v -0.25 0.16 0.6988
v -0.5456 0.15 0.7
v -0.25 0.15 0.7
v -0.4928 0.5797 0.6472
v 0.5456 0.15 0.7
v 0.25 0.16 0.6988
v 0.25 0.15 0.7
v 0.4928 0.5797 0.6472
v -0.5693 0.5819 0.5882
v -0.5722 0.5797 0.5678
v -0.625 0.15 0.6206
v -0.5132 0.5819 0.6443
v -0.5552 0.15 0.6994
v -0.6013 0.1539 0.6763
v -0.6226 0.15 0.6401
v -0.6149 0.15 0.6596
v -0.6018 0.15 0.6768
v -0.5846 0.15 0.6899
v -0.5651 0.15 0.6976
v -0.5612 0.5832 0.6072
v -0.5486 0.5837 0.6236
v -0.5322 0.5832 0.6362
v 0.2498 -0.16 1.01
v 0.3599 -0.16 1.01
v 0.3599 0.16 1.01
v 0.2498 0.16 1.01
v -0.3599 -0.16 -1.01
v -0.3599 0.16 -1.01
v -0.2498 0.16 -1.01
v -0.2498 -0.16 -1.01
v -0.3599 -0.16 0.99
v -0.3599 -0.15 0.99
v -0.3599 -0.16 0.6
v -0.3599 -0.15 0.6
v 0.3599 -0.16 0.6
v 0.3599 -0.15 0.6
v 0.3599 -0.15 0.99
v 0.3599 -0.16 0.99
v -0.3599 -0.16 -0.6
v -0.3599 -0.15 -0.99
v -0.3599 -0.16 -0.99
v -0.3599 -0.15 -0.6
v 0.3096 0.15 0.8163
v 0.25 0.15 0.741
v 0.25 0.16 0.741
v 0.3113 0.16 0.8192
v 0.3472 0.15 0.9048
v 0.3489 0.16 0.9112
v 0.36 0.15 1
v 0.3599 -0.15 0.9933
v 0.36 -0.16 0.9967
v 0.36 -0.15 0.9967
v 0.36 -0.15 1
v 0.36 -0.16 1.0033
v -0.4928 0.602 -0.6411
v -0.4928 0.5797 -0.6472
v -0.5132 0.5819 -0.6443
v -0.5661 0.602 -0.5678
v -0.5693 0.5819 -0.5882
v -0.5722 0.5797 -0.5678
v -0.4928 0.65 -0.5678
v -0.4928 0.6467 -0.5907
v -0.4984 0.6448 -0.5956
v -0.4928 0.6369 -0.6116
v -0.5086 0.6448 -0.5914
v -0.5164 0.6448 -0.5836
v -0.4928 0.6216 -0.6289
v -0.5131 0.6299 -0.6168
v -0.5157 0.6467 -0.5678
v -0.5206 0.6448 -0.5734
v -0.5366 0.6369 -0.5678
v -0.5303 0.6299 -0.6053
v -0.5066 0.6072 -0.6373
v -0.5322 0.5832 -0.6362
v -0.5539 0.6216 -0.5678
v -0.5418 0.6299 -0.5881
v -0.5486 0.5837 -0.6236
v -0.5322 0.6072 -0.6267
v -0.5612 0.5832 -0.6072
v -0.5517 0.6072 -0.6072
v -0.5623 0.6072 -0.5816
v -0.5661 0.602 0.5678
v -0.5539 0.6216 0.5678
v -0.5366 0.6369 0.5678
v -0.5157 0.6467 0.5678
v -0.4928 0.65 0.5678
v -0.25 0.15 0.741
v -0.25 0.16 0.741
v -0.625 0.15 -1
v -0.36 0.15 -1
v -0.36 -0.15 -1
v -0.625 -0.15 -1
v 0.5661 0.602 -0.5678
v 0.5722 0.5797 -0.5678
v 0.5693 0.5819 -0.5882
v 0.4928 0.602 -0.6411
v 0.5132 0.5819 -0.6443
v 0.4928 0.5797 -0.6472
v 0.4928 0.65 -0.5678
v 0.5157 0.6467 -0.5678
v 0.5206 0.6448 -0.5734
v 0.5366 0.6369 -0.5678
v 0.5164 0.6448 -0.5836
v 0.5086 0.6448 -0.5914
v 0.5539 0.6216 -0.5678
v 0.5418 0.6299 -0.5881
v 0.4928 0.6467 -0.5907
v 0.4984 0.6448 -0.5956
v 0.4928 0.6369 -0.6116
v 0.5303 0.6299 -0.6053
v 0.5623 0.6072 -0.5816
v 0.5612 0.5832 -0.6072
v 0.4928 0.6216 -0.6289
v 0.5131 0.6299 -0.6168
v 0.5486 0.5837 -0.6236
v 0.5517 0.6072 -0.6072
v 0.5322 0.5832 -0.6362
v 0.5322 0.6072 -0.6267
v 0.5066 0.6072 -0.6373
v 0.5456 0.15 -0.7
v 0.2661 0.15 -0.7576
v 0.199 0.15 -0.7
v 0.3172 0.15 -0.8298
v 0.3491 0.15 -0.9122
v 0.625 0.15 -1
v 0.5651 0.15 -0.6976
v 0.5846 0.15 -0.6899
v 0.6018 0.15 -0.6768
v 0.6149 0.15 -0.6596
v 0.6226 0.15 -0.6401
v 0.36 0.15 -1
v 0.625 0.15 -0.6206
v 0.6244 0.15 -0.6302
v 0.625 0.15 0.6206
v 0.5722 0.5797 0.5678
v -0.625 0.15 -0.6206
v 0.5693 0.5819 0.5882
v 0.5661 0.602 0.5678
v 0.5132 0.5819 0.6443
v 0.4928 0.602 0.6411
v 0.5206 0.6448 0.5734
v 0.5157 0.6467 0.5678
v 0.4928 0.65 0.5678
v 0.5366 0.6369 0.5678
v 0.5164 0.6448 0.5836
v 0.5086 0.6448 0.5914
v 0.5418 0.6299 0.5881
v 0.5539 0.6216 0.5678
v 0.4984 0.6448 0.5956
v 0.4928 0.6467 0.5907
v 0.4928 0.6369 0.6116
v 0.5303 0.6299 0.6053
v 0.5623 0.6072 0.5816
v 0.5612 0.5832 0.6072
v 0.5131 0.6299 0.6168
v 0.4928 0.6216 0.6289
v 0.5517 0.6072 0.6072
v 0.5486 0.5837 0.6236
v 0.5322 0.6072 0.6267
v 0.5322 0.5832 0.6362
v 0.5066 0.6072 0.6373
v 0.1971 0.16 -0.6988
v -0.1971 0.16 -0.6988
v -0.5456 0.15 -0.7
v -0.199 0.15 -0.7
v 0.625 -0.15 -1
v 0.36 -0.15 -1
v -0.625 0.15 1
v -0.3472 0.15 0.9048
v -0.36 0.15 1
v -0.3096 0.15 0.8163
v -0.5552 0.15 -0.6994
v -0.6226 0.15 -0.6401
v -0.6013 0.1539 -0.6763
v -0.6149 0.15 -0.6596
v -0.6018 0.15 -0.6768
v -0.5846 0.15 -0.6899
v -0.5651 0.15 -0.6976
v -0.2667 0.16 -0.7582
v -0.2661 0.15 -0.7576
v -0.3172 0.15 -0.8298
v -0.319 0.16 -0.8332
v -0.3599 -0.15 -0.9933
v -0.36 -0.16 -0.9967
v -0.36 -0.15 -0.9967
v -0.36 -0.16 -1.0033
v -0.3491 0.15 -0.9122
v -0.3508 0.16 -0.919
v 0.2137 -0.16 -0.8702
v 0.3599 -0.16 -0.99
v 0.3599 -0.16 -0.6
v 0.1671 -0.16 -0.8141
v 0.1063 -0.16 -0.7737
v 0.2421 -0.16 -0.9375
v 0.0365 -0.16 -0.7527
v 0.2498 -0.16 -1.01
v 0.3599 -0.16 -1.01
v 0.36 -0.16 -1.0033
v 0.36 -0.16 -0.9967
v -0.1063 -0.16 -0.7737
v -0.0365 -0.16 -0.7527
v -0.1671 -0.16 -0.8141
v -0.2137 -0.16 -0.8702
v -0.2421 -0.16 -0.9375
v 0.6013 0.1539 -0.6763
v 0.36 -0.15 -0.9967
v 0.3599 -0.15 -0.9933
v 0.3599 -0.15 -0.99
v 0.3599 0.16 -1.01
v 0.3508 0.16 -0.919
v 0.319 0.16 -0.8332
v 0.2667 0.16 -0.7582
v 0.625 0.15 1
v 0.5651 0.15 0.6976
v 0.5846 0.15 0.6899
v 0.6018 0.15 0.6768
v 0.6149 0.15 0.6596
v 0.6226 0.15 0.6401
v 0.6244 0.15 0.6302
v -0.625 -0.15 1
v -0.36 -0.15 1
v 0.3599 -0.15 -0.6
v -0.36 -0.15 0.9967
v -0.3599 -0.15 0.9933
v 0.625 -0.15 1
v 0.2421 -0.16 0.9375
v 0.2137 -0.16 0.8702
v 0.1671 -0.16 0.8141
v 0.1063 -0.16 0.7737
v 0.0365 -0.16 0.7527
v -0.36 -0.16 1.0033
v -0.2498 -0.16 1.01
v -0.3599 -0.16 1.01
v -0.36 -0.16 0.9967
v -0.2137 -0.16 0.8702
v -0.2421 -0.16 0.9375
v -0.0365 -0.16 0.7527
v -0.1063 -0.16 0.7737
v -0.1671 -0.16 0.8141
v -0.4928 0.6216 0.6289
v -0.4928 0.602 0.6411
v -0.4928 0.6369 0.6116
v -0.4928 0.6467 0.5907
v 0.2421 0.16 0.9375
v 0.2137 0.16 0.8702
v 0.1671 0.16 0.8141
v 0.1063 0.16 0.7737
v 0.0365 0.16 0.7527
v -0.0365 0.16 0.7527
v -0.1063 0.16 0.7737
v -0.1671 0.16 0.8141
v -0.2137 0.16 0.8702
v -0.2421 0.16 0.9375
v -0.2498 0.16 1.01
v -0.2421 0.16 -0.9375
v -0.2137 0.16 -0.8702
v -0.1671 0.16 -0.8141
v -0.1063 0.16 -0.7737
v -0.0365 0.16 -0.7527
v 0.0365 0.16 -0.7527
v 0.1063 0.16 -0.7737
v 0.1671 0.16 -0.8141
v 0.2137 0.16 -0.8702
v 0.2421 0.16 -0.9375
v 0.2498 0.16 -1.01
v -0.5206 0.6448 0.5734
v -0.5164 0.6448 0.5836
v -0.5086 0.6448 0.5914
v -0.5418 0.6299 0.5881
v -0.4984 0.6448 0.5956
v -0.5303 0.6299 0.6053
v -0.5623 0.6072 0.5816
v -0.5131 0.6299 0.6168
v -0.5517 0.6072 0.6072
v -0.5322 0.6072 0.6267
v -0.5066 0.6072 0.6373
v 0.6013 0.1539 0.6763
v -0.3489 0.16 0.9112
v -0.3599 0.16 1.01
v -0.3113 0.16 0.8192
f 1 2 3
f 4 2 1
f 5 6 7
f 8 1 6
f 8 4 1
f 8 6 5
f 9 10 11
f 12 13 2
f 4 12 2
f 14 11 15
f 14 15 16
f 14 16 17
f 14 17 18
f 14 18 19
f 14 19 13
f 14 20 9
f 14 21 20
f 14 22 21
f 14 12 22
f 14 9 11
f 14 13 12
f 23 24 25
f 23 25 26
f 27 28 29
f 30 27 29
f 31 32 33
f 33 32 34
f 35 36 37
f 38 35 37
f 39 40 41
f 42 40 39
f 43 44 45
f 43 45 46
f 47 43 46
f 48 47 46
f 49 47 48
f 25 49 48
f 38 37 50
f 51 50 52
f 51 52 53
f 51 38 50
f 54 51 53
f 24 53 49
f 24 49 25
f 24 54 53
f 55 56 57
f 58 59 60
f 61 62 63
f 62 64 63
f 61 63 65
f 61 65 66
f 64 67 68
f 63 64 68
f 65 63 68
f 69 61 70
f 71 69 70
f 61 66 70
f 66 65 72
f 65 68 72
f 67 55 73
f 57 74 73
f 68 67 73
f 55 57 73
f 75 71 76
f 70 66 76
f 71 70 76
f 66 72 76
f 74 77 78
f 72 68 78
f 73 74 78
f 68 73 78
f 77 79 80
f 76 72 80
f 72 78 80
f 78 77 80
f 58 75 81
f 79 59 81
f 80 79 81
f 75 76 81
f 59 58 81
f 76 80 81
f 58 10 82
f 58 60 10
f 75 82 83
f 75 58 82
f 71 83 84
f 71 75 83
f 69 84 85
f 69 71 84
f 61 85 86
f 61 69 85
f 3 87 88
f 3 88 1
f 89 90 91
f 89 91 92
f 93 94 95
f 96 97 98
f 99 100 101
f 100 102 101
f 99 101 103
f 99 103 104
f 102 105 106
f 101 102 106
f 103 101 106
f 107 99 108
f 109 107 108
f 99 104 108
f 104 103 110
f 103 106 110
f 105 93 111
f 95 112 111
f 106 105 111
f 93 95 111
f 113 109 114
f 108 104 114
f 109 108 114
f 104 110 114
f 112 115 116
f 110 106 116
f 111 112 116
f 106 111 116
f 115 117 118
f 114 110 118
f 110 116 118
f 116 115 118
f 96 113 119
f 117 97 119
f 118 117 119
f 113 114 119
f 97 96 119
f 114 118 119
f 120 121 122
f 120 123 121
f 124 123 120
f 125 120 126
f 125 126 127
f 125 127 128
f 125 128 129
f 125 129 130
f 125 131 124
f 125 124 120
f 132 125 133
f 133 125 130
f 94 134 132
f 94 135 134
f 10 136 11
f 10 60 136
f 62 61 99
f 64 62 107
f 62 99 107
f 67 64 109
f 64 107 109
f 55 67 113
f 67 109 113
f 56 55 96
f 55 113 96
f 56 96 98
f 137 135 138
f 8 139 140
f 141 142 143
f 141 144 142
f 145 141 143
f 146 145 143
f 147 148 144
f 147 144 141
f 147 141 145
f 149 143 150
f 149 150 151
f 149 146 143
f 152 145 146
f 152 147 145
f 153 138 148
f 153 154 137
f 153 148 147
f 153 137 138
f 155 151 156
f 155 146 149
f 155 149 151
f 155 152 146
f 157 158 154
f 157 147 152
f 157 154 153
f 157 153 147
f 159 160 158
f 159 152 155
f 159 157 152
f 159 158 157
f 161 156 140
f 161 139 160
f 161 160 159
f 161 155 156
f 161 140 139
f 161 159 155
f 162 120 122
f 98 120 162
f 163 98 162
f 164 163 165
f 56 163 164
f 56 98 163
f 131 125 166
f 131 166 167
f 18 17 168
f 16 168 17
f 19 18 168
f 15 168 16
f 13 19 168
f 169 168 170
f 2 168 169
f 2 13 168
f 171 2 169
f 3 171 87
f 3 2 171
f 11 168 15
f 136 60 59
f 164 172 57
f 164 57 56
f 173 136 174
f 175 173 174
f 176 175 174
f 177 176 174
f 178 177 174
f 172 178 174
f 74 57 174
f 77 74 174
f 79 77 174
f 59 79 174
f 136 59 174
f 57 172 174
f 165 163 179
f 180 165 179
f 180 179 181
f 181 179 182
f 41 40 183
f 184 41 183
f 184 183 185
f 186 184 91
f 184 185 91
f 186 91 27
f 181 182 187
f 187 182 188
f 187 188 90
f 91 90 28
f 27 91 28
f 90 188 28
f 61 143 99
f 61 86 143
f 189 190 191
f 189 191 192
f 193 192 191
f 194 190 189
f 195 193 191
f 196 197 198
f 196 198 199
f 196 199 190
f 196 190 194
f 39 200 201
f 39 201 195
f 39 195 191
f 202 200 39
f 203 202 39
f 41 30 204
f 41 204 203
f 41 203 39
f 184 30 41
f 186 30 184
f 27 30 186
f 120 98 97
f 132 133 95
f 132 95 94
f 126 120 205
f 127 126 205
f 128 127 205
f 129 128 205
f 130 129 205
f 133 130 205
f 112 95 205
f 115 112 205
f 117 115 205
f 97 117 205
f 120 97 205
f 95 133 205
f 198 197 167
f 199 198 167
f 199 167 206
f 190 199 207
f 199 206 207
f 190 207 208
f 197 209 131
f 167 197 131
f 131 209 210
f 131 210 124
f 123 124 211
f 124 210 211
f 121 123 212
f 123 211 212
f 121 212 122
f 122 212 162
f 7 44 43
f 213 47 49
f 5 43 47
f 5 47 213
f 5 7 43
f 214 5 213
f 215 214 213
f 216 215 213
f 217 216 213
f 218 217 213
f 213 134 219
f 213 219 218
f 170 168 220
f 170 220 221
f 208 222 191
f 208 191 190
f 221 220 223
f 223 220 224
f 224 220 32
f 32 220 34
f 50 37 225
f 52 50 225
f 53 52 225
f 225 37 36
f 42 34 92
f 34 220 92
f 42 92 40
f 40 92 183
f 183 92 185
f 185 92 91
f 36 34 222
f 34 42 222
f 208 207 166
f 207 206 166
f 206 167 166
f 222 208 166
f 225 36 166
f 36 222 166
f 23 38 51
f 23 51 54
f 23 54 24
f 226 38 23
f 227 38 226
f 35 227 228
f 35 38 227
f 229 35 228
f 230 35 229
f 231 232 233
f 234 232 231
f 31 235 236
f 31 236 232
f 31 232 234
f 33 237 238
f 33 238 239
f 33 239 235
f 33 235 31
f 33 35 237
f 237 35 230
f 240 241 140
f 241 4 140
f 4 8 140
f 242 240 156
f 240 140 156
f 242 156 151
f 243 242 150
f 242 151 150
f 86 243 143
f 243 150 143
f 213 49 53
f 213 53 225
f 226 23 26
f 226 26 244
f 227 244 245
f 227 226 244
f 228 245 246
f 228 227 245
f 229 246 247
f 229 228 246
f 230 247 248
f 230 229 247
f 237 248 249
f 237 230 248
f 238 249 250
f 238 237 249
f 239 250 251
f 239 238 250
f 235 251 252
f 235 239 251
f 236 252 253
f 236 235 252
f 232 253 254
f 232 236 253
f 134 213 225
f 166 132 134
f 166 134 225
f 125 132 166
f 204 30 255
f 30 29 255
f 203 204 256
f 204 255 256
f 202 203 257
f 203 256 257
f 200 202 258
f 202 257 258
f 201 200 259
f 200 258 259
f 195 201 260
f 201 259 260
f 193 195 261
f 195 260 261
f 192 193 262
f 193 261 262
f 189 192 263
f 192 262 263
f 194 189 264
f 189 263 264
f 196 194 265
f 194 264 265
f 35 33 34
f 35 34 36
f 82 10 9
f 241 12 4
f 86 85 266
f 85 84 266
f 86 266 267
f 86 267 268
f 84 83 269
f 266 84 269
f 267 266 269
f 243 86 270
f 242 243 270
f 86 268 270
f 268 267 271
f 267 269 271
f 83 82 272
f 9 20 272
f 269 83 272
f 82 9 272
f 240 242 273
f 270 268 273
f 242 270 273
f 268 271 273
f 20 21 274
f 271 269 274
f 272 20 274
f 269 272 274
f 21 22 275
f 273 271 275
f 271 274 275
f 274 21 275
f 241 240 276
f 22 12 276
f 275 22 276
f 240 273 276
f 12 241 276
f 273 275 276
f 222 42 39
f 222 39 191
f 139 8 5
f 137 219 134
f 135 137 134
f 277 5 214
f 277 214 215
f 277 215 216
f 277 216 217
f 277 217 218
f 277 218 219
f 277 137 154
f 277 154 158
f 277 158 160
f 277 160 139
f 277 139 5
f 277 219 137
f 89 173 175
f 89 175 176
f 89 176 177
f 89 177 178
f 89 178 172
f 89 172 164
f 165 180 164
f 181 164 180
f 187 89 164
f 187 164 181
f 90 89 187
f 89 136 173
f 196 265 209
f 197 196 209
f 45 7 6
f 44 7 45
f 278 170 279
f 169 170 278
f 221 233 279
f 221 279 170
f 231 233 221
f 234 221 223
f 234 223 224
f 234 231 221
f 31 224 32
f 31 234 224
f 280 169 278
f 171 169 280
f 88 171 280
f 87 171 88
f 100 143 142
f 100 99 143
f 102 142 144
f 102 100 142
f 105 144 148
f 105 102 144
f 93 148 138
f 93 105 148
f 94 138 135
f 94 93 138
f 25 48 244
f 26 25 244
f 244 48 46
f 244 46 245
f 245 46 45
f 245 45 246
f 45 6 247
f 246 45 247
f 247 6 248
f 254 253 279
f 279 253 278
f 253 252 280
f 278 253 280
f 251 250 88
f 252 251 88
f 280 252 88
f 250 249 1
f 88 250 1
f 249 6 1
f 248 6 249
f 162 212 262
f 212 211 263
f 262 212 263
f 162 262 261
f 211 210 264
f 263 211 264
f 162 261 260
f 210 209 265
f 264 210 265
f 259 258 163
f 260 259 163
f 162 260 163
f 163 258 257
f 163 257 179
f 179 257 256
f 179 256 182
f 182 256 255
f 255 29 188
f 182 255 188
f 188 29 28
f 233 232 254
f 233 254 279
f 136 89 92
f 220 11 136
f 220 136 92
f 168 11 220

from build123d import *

# Parameters (mm, degrees)
BASE_DEPTH        = 0.15
LEAD_TOP_DEPTH    = 0.16
LEAD_START        = -0.01
LEAD_BOTTOM_DEPTH = 0.01
SKETCH7_W         = 1.25
SKETCH7_H         = 1.4
LENS_DEPTH        = 0.5
LENS_TAPER        = 7
FILLET_2_R        = 0.08


with BuildPart() as part:
    # Sketch1 → Base (new, symmetric)
    with BuildSketch(Plane(origin=(0, 0, 0), x_dir=(1, 0, 0), z_dir=(0, 1, 0))):
        with BuildLine():
            Line((-0.625, -1), (-0.25, -1))
            ThreePointArc((-0.25, -1), (0, -0.75), (0.25, -1))
            Line((0.25, -1), (0.625, -1))
            Line((0.625, -1), (0.625, 1))
            Line((0.625, 1), (0.25, 1))
            ThreePointArc((0.25, 1), (0, 0.75), (-0.25, 1))
            Line((-0.25, 1), (-0.625, 1))
            Line((-0.625, 1), (-0.625, -1))
        make_face()
    extrude(amount=BASE_DEPTH, both=True)

    # Sketch8 → Lead top (add, symmetric)
    with BuildSketch(Plane(origin=(0, 0, 0), x_dir=(1, 0, 0), z_dir=(0, 1, 0))):
        with BuildLine():
            Line((-0.25, -0.740963323), (-0.25, -0.6))
            Line((-0.25, -0.6), (0.25, -0.6))
            Line((0.25, -0.6), (0.25, -0.740963323))
            ThreePointArc((0.25, -0.740963323), (0.333283391, -0.86390378), (0.359861084, -1.01))
            Line((0.359861084, -1.01), (0.24979992, -1.01))
            ThreePointArc((0.24979992, -1.01), (0, -0.75), (-0.24979992, -1.01))
            Line((-0.24979992, -1.01), (-0.359861084, -1.01))
            ThreePointArc((-0.359861084, -1.01), (-0.333283391, -0.86390378), (-0.25, -0.740963323))
        make_face()
        with BuildLine():
            Line((-0.359861084, 1.01), (-0.24979992, 1.01))
            ThreePointArc((-0.24979992, 1.01), (0, 0.75), (0.24979992, 1.01))
            Line((0.24979992, 1.01), (0.359861084, 1.01))
            ThreePointArc((0.359861084, 1.01), (0, 0.64), (-0.359861084, 1.01))
        make_face()
    extrude(amount=LEAD_TOP_DEPTH, both=True)

    # Sketch10 → Lead bottom (add)
    with BuildSketch(Plane.XZ.offset(0.16).offset(LEAD_START)):
        with BuildLine():
            Line((-0.359861084, 1.01), (-0.359861084, 0.6))
            Line((-0.359861084, 0.6), (0.359861084, 0.6))
            Line((0.359861084, 0.6), (0.359861084, 1.01))
            Line((0.359861084, 1.01), (0.24979992, 1.01))
            ThreePointArc((0.24979992, 1.01), (0, 0.75), (-0.24979992, 1.01))
            Line((-0.24979992, 1.01), (-0.359861084, 1.01))
        make_face()
        with BuildLine():
            Line((-0.359861084, -0.6), (0.359861084, -0.6))
            Line((0.359861084, -0.6), (0.359861084, -1.01))
            Line((0.359861084, -1.01), (0.24979992, -1.01))
            ThreePointArc((0.24979992, -1.01), (0, -0.75), (-0.24979992, -1.01))
            Line((-0.24979992, -1.01), (-0.359861084, -1.01))
            Line((-0.359861084, -1.01), (-0.359861084, -0.6))
        make_face()
    extrude(amount=LEAD_BOTTOM_DEPTH)

    # Sketch7 → Lens (add)
    with BuildSketch(Plane(origin=(0, 0.15, 0), x_dir=(1, 0, 0), z_dir=(0, 1, 0))):
        Rectangle(SKETCH7_W, SKETCH7_H)
    extrude(amount=LENS_DEPTH, taper=LENS_TAPER)

    # Fillet 2
    fillet_2_edges = [part.edges().sort_by_distance(p)[0] for p in [
        (-0.59430386, 0.4, 0.66930386),
        (0.59430386, 0.4, -0.66930386),
        (0.59430386, 0.4, 0.66930386),
        (-0.59430386, 0.4, -0.66930386),
        (0.56360772, 0.65, 0),
        (0, 0.65, -0.63860772),
        (-0.56360772, 0.65, 0),
        (0, 0.65, 0.63860772),
    ]]
    fillet(fillet_2_edges, radius=FILLET_2_R)


solid = part.part
